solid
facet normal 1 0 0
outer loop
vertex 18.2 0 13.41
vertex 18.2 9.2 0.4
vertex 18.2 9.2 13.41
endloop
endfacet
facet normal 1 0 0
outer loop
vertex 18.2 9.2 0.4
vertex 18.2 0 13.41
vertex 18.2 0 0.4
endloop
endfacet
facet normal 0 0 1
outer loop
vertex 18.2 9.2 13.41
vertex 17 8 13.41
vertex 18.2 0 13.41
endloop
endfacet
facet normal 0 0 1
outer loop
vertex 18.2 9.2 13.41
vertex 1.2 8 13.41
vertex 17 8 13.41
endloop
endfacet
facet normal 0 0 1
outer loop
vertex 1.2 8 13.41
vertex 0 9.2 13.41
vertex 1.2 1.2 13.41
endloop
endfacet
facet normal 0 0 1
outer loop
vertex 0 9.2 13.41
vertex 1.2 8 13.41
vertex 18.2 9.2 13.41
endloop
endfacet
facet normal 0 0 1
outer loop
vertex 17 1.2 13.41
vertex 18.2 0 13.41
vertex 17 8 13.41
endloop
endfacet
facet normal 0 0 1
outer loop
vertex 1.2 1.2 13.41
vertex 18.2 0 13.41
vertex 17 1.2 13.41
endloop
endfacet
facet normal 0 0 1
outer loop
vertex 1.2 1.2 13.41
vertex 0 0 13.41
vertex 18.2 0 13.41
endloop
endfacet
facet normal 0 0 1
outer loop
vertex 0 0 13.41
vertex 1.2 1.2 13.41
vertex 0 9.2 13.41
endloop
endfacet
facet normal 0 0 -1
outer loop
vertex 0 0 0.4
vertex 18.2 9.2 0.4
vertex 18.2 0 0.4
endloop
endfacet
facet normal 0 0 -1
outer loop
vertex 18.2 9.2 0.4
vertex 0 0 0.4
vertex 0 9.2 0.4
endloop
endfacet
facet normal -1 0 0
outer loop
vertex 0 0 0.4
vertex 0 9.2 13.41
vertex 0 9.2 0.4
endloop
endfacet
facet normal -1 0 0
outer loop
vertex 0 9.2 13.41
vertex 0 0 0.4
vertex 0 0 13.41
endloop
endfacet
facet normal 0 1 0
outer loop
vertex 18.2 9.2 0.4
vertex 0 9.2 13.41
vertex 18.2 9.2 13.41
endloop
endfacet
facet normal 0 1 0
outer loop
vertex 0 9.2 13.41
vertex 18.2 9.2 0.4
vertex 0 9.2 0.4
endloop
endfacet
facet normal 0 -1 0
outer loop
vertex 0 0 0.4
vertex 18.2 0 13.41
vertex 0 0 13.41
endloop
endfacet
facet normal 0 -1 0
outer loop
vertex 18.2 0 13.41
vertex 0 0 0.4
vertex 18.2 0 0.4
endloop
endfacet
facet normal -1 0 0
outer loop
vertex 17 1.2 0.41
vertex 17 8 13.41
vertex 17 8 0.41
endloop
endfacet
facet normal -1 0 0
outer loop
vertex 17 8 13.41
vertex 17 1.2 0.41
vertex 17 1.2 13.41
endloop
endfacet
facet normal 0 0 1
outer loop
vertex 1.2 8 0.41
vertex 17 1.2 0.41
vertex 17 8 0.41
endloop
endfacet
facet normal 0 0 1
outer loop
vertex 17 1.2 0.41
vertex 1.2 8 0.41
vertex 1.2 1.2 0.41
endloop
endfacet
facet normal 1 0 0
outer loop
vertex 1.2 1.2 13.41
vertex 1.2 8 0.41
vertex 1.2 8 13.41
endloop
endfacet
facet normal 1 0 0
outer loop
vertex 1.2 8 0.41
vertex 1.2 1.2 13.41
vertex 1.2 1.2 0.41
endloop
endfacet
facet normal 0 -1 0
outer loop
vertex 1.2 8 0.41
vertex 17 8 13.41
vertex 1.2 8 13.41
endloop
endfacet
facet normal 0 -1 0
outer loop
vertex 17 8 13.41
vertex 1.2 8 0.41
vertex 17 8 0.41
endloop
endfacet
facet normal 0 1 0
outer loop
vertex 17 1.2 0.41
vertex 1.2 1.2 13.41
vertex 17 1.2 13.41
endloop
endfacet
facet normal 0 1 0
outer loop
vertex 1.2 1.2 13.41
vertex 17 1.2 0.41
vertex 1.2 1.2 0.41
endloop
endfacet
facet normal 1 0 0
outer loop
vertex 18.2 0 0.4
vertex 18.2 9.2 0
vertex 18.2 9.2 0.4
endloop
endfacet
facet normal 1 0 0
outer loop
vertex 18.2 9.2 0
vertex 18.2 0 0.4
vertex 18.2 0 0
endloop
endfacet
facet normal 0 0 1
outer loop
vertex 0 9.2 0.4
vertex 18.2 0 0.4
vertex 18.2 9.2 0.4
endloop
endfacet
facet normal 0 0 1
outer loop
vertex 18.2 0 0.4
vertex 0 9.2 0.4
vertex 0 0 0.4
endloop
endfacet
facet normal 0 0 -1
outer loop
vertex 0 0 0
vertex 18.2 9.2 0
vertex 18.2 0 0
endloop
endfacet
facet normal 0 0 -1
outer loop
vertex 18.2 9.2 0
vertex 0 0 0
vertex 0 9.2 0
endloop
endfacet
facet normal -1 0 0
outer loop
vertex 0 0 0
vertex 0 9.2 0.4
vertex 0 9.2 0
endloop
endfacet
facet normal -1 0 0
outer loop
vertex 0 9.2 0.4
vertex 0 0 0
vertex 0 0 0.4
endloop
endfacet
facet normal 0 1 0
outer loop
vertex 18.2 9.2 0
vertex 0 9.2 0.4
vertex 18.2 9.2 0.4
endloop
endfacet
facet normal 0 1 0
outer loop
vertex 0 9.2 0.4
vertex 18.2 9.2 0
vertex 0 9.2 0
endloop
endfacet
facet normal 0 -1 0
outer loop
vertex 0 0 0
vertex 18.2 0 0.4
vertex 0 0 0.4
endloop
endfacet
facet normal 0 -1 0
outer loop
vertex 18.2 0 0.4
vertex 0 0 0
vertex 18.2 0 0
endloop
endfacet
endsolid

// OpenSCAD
// file: ../../Base/Rotation.scad
// Fischertechnik Box Foundation
// Geometry Helpers Rotation

include <PlacementOptions.scad>

// getRotatedSpace(space, rotation=NoRotation)
// Rotates the space dependent on the specified rotation

function getRotatedSpace(space, rotation=NoRotation) = [
    (rotation == Rotate90 || rotation == Rotate270) ? space.y : space.x,
    (rotation == Rotate90 || rotation == Rotate270) ? space.x : space.y
];

// Rotates the given space around the fixed left lower corner
// space = the space the children needs as width/depth list [width,depth]
// rotation = 0 Rotate0 degrees, 1 Rotate90 degrees, 2 Rotate180 degrees, 3 Rotate270 degrees (equivalent to -90)

module RotateFix(space, rotation=NoRotation) {
    dy = (rotation == Rotate0 || rotation == Rotate270) ? 0 :
        (rotation == Rotate90) ? space.x :
        space.y;
    dx = (rotation < Rotate180) ? 0 :
        (rotation == Rotate180) ? space.x :
        space.y;
    
    translate([dx, dy, 0])
        rotate([0, 0, rotations[rotation]])
            children();
}
// file: ../../Base/Alignment.scad
// Fischertechnik Box Foundation
// Geometry Helpers Alignment

include <PlacementOptions.scad>

// getAlignedX(elementWidth, spaceWidth, align=AlignRight, offset=0)
// Gets the aligned X offset of an element with the given
// width in the given space.
// elementWidth = The width of the element to positon
// spaceWidth = The space where the element should be aligned
// align = 0 AlignLeft, 1 AlignCenter, 2 AlignRight
// offset = an optional offset from the aligned position. When
// aligned left or centered, then positive values are in X direction.
// When aligned right then positive values are in negative X direction.

function getAlignedX(elementWidth, spaceWidth, align=AlignRight, offset=0) =
    (align == AlignLeft) ?
        offset :
        ((align == AlignCenter) ?
        (spaceWidth - elementWidth)/2 + offset :
        spaceWidth - offset - elementWidth);

// getAlignedY(elementDepth, spaceDepth, align=AlignTop, offset=0)
// Gets the aligned Y offset of an element with the given
// depth in the given space.
// elementDepth = The depth of the element to positon
// spaceDepth = The space where the element should be aligned
// align = 0 AlignBottom, 1 AlignCenter, 2 AlignTop
// offset = an optional offset from the aligned position. When
// aligned bottom or centered, then positive values are in Y direction.
// When aligned top then positive values are in negative Y direction.

function getAlignedY(elementDepth, spaceDepth, align=AlignTop, offset=0) =
    (align == AlignBottom) ?
        offset :
        ((align == AlignCenter) ?
        (spaceDepth - elementDepth)/2 + offset :
        spaceDepth - offset - elementDepth);
// file: ../../Base/PlacementOptions.scad
// Fischertechnik Box Foundation
// Placement Options

// Alignment
NoAlign = 0;
AlignLeft = 1;
AlignBottom = 2;
AlignCenter = 3;
AlignRight = 4;
AlignTop = 5;

// Element rotation degree steps
rotations = [0, -90, -180, -270];

// Rotation
NoRotation = 0;
Rotate0 = 0;
Rotate90 = 1;
Rotate180 = 2;
Rotate270 = 3;

// Docking (seen from above)
NoDock = -1;
DockLeft = 0;
DockTop = 1;
DockRight = 2;
DockCorner = 2;
DockBottom = 3;

// Web corners
LowerLeft = 0;
UpperLeft = 1;
UpperRight = 2;
LowerRight = 3;

// Web position relative to corner
LeftOfCorner = 0;
RightOfCorner = 1;
// file: ../../Base/Boxes.scad
// Fischertechnik Box Foundation
// Pre-designed Boxes

use <Constants.scad>

include <PlacementOptions.scad>

box190Width = 190;
box190Depth = 130;
box130Width = 130;
box130Depth = 95;

// Values are from an original ec3 box
topBottomDifference = 1.5;
outerHeight = 40;
innerHeight = 38.2;
baseThickness = outerHeight - innerHeight;
stackExcess = 5.7;
radius = 3.5;
wallThickness = 1.5;
tolerance = 0.2;
stackOffset = innerHeight - stackExcess;

boxUsageHeight = stackOffset;
boxWallThickness = wallThickness;
boxBaseThickness = baseThickness;
boxWebWidth = 3.0;

// getBoxWallThickness()
// Gets the wall thickness of a Fischertechnik Box
function getBoxWallThickness() = boxWallThickness;

// getBoxUsageHeight()
// Gets the usable height of a Fischertechnik box
function getBoxUsageHeight() = boxUsageHeight;

// getBoxInnerHeight()
// Gets the inner height of a Fischertechnik box, including the stack excess
function getBoxInnerHeight() = innerHeight;

// getBoxBaseThickness()
// Gets the thickness of the Fischertechnik box base.
function getBoxBaseThickness() = boxBaseThickness;

// getBoxWebWidth()
// Gets the width of a box web
function getBoxWebWidth() = boxWebWidth;

// getBox190Space()
// Gets the usable inner space of a Box 190 as an x/y-list
function getBox190Space() = [
    box190Width - 2*getBoxWallThickness() - topBottomDifference, 
    box190Depth - 2*getBoxWallThickness() - topBottomDifference ];

// BoxBase(width, depth)
// Creates an empty stackable Fischertechnik compatible box
// width = Outer width of the box (190, 130, ...)
// depth = Outer depth of the box (130, 95, ...)

module BoxBase(width, depth, height=outerHeight) {    
    thinPlate = 0.01;

    innerHeight = height - baseThickness;    
    
    module BodyPlate(width, depth) {
        translate([radius, radius])
        hull() {
            w = width-2*radius;
            d = depth-2*radius;
            cube([w, d, thinPlate]);
            cylinder(thinPlate, r=radius, $fn=getFragments());
            translate([w, 0])
                cylinder(thinPlate, r=radius, $fn=getFragments());
            translate([w, d])
                cylinder(thinPlate, r=radius, $fn=getFragments());
            translate([0, d])
                cylinder(thinPlate, r=radius, $fn=getFragments());
        }
    }
    
    module Body(tolerance=tolerance) {
        hull() {
            // Bottom with tolerance to fit into the original boxes when stacked
            translate([-wallThickness+tolerance, -wallThickness+tolerance, -baseThickness])
                BodyPlate(width-topBottomDifference-2*tolerance, depth-topBottomDifference-2*tolerance);
            
            // Top
            translate([-wallThickness-topBottomDifference/2, -wallThickness-topBottomDifference/2, innerHeight-thinPlate])
                BodyPlate(width, depth);
         }
    }

    module Cutoff() {
        hull() {
            coWidth = width - 2*wallThickness;
            coDepth = depth - 2*wallThickness;
            
            // Bottom
            BodyPlate(coWidth-topBottomDifference, coDepth-topBottomDifference);

            // Top
            translate([-topBottomDifference/2, -topBottomDifference/2, innerHeight+thinPlate]) 
                BodyPlate(coWidth, coDepth);
        }
    }
    
    difference() {        
        Body();
        Cutoff();
        stackOffset = innerHeight - stackExcess;
        translate([0, 0, stackOffset + baseThickness])
            Body(tolerance=0);
    }
}

// Creates the Fischertechnik empty box 130x190 mm and places it at position 0,0
// 190x130 are the outer sizes, the inner space is slightly smaller. Use getBox190Space() to get the inner sizes.
// The box is positioned that the usable inner space is at the 0,0,0 position. The

module Box190() {
    BoxBase(box190Width, box190Depth);
}

// Gets the usable inner space of a Box 130 as an x/y-list
function getBox130Space() = [
    box130Width - 2*getBoxWallThickness() - topBottomDifference, 
    box130Depth - 2*getBoxWallThickness() - topBottomDifference ];

// Creates the Fischertechnik empty box 95x130 mm and places it at position 0,0
// 190x130 are the outer sizes, the inner space is slightly smaller. Use getBox190Space() to get the inner sizes.
// The box is positioned that the usable inner space is at the 0,0,0 position. The

module Box130() {
    BoxBase(box130Width, box130Depth);
}

// Creates a web at the specified box walls
// corner 0 = LowerLeft, 1 = UpperLeft, 2 = UpperRight, 3 = LowerRight
// side 0 = LeftOfCorner, 1 = RightOfCorner
// distance = Distance in mm from the corner
// boxSpace = inner width and depth of the box (default: Box 190)
// webWidth = length of the web (default is 3 mms)
// webThickness = thickness of the web (default is 1 mm)

module BoxWeb(corner, side, distance, boxSpace=getBox190Space(), webWidth=getBoxWebWidth(), webThickness=1.0) {
    sink = getBoxWallThickness()/2;

    width = (corner % 2 == 0) ? 
            (side == LeftOfCorner ? webWidth : webThickness) :
            (side == LeftOfCorner ? webThickness : webWidth);

    depth = (corner % 2 == 0) ? 
            (side == RightOfCorner ? webWidth : webThickness) :
            (side == RightOfCorner ? webThickness : webWidth);
    
    xDiff = corner == LowerLeft ? 
                (side == LeftOfCorner ? -sink : distance) :
            (corner == UpperLeft ?                
                (side == LeftOfCorner ? distance : -sink) :
            (corner == UpperRight ?
                (side == LeftOfCorner ? boxSpace.x-webWidth+sink : boxSpace.x-distance-webThickness) :
                (side == LeftOfCorner ? boxSpace.x-distance-webThickness: boxSpace.x-webWidth+sink)));

    yDiff = corner == LowerLeft ? 
                (side == RightOfCorner ? -sink : distance) :
            (corner == UpperLeft ?
                (side == RightOfCorner ? boxSpace.y-distance : boxSpace.y-webWidth+sink) :
            (corner == UpperRight ?
                (side == RightOfCorner ? boxSpace.y-webWidth+sink : boxSpace.y-distance) :
                (side == RightOfCorner ? distance : -sink)));
    
    translate([xDiff, yDiff, -getExcess()])
        cube([width, depth, boxUsageHeight + 2*getExcess()]);
}
// file: ../../Base/Placement.scad
// Fischertechnik Box Foundation
// Geometry Helpers Placement

use <Constants.scad>
use <Alignment.scad>
use <Rotation.scad>
use <Boxes.scad>

include <PlacementOptions.scad>

// Place(x=0, y=0, elementSpace=[0,0], alignX=AlignLeft, alignY=AlignBottom, rotation=Rotate0, boxSpace=getBox190Space())
// Places the child at the specified position
// y = Y-Position. This is a relative position when an X aligment is specified.
// x = X-Position. This is a relative position when an Y aligment is specified.
// elementSpace = space of the element to be placed [x,y]
// alignX = -1=NoAlign, 0 AlignLeft, 1 AlignCenter, 3 AlignRight (elementSpace and boxSpace required!)
// alignY = -1=NoAlign, 2 AlignBottom, 1 AlignCenter, 4 AlignTop (elementSpace and boxSpace required!)
// rotation = 0 Rotate0 0 degrees, 1 Rotate90 90 degrees, 
// 2 Rotate180 180 degrees, 3 Rotate270 270 degrees (equivalent to -90)
// boxSpace = Inner space of the box where the placement occurs [x,y] - default is Box 190x130 inner space

module Place(x=0, y=0, elementSpace=[0,0], 
  alignX=AlignLeft, alignY=AlignBottom, 
  rotation=NoRotation, boxSpace=getBox190Space()) {

    module Position(x, y, space, rotation=Rotate0) {
        translate([x, y, 0])
            RotateFix(space, rotation)
                children();
    }

    space = getRotatedSpace(elementSpace, rotation);
    alignedX = getAlignedX(space.x, boxSpace.x, alignX, x);
    alignedY = getAlignedY(space.y, boxSpace.y, alignY, y);
    Position(alignedX, alignedY, elementSpace, rotation)
        children();
}

// Center(space=getBox130Space(), elementSpace=[0,0])
// space = Space where the children is centered. For cylinder use centered=true and no elementSpace.
// elementSpace = space of the element to be centered [x,y]

module Center(space=getBox190Space(), elementSpace=[0,0]) {
    Place(elementSpace=elementSpace, boxSpace=space, alignX=AlignCenter, alignY=AlignCenter)
        children();
}

// CenterHorizontal(width=0, y=0, offset=0, space=getBox130Space())
// width = Width of the element to be placed.
// y = Y position of the element
// offset = Offset from the center position (negative will be left of the center)
// space = Space where the element is placed

module CenterHorizontal(width=0, y=0, offset=0, space=getBox190Space()) {
    Place(x=offset, y=y, elementSpace=[width, 0], boxSpace=space, alignX=AlignCenter)
        children(0);
}

// CenterVertical(depth=0, x=0, offset=0, space=getBox130Space())
// depth = Depth of the element to be placed.
// x = X position of the element
// offset = Offset from the center position (negative will be down of the center)
// space = Space where the element is placed

module CenterVertical(depth=0, x=0, offset=0, space=getBox190Space()) {
    Place(x=x, y=offset, elementSpace=[0, depth], boxSpace=space, alignY=AlignCenter)
        children(0);
}

// getIsVertical(align)
// True if the specified alignment needs a vertical orientation for a divider (AlignRight, AlignLeft)

function getIsVertical(align) = (align == AlignRight || align == AlignLeft);

// getIsHorizontal(align)
// True if the specified alignment needs a horizontal orientation for a divider (AlignTop, AlignBottom)

function getIsHorizontal(align) = (align == AlignTop || align == AlignBottom);
// file: ../../Elements/AxisClip10.scad
// Fischertechnik Box Library
// Axis for clip 10
// 31023

use <../ModelBase/Simple.scad>
use <../Base/Constants.scad>

width = 12;
depth = 12;
height = 23;
upperDiameter = 3.6;
clipHeight = 10;

// getAxisClip10Space()
// Gets the space of a frame for a clip 10 with spring ring (mot2)

function getAxisClip10Space() = [width, depth, height];

// AxisClip10(height, clipHeight)
// Axis for clip 10 with spring ring (mot2)
// height = Height of the complete axis
// clipHeight = Height of the rt for the clip (standard is 10, in mot3 its only 7)

module AxisClip10(height=height, clipHeight=clipHeight) {
    LeveledAxisWithSpace(height, height-clipHeight, getAxisClip10Space(), diameter=upperDiameter);
}

// Tests
color("lightgray")
AxisClip10();
// file: ../../Base/Constants.scad
// Fischertechnik Box Foundation
// Constants

// Constant values necessary for multiple elements

// Base constants
dividerThickness = 1.2;
excess = 0.01;
fragments = 90;
tolerance = 0.8;

// Gets the thickness of a divider 
function getDividerThickness() = dividerThickness;

// Gets the excess that is used to merge walls into each other
function getExcess() = excess;

// Gets amount of fragments of a cylinder
function getFragments() = fragments;

// Gets the inner tolerance of a frame to each side
function getTolerance() = tolerance;


// Fischertechnik specific constants
axisDiameter = 4;
axisBottomDiameter = axisDiameter + 1;
standardEdgeDistance = 2.5;
standardWebDistance = 11.5;
standardCornerLength = 15;
tubeWallFactor = 0.8;
smallPartsFrameHeight = 20;

// Gets axis diameter
function getAxisDiameter() = axisDiameter;

// Gets axis bottom diameter for thicker part at the bottom
function getAxisBottomDiameter() = axisBottomDiameter;

// gets the standard distance to the wall of the box for dockable frames with webs
function getStandardEdgeDistance() = standardEdgeDistance;

// gets the standard distance of each web to the corner of the dockable frame
function getStandardWebDistance() = standardWebDistance;

// gets the standard length of the corner walls of a dockable frame
function getStandardCornerLength() = standardCornerLength;

// gets the wall thickness of a tube.
function getTubeWallThickness() = tubeWallFactor * getDividerThickness();

// gets the frame height for docked small parts boxes.
function getSmallPartsFrameHeight() = smallPartsFrameHeight;
// file: ../../Elements/FramePluggedCapacitor.scad
// Fischertechnik Box Library
// Frame for Plugged Capacitor (two plugs)
// 36387

use <../ModelBase/Simple.scad>

width = 15;
depth = 6;
height = 13;

// getFramePluggedCapacitorSpace()
// Gets the space the frame for a plugged capacitor needs as width and depth (.x and .y as a list)

function getFramePluggedCapacitorSpace() = getFrameOuterVolume([width, depth, height]);

// FramePluggedCapacitor()
// The walls of the frame are 13 mm high. 
// The complete frame has a tolerance of addition 1 mm in each direction.

module FramePluggedCapacitor() {
    Frame([width, depth, height]);
}

// Tests
color("lightgray") {
FramePluggedCapacitor();
}
// file: ../TestPrint.scad
// 3D Print Test Base

use <../Base/Constants.scad>

use <../Elements/AxisClip10.scad>

module TestPrint(elementSpace) {
    cube([elementSpace.x, elementSpace.y, 0.4]);
    translate([0,0,0.4+getExcess()]) {
        children();
    }
}

TestPrint(getAxisClip10Space())
    AxisClip10();
// main file
// 3D Print Test
// FramePluggedCapacitor

use <../TestPrint.scad>
use <../../Elements/FramePluggedCapacitor.scad>

TestPrint(getFramePluggedCapacitorSpace())
    FramePluggedCapacitor();
